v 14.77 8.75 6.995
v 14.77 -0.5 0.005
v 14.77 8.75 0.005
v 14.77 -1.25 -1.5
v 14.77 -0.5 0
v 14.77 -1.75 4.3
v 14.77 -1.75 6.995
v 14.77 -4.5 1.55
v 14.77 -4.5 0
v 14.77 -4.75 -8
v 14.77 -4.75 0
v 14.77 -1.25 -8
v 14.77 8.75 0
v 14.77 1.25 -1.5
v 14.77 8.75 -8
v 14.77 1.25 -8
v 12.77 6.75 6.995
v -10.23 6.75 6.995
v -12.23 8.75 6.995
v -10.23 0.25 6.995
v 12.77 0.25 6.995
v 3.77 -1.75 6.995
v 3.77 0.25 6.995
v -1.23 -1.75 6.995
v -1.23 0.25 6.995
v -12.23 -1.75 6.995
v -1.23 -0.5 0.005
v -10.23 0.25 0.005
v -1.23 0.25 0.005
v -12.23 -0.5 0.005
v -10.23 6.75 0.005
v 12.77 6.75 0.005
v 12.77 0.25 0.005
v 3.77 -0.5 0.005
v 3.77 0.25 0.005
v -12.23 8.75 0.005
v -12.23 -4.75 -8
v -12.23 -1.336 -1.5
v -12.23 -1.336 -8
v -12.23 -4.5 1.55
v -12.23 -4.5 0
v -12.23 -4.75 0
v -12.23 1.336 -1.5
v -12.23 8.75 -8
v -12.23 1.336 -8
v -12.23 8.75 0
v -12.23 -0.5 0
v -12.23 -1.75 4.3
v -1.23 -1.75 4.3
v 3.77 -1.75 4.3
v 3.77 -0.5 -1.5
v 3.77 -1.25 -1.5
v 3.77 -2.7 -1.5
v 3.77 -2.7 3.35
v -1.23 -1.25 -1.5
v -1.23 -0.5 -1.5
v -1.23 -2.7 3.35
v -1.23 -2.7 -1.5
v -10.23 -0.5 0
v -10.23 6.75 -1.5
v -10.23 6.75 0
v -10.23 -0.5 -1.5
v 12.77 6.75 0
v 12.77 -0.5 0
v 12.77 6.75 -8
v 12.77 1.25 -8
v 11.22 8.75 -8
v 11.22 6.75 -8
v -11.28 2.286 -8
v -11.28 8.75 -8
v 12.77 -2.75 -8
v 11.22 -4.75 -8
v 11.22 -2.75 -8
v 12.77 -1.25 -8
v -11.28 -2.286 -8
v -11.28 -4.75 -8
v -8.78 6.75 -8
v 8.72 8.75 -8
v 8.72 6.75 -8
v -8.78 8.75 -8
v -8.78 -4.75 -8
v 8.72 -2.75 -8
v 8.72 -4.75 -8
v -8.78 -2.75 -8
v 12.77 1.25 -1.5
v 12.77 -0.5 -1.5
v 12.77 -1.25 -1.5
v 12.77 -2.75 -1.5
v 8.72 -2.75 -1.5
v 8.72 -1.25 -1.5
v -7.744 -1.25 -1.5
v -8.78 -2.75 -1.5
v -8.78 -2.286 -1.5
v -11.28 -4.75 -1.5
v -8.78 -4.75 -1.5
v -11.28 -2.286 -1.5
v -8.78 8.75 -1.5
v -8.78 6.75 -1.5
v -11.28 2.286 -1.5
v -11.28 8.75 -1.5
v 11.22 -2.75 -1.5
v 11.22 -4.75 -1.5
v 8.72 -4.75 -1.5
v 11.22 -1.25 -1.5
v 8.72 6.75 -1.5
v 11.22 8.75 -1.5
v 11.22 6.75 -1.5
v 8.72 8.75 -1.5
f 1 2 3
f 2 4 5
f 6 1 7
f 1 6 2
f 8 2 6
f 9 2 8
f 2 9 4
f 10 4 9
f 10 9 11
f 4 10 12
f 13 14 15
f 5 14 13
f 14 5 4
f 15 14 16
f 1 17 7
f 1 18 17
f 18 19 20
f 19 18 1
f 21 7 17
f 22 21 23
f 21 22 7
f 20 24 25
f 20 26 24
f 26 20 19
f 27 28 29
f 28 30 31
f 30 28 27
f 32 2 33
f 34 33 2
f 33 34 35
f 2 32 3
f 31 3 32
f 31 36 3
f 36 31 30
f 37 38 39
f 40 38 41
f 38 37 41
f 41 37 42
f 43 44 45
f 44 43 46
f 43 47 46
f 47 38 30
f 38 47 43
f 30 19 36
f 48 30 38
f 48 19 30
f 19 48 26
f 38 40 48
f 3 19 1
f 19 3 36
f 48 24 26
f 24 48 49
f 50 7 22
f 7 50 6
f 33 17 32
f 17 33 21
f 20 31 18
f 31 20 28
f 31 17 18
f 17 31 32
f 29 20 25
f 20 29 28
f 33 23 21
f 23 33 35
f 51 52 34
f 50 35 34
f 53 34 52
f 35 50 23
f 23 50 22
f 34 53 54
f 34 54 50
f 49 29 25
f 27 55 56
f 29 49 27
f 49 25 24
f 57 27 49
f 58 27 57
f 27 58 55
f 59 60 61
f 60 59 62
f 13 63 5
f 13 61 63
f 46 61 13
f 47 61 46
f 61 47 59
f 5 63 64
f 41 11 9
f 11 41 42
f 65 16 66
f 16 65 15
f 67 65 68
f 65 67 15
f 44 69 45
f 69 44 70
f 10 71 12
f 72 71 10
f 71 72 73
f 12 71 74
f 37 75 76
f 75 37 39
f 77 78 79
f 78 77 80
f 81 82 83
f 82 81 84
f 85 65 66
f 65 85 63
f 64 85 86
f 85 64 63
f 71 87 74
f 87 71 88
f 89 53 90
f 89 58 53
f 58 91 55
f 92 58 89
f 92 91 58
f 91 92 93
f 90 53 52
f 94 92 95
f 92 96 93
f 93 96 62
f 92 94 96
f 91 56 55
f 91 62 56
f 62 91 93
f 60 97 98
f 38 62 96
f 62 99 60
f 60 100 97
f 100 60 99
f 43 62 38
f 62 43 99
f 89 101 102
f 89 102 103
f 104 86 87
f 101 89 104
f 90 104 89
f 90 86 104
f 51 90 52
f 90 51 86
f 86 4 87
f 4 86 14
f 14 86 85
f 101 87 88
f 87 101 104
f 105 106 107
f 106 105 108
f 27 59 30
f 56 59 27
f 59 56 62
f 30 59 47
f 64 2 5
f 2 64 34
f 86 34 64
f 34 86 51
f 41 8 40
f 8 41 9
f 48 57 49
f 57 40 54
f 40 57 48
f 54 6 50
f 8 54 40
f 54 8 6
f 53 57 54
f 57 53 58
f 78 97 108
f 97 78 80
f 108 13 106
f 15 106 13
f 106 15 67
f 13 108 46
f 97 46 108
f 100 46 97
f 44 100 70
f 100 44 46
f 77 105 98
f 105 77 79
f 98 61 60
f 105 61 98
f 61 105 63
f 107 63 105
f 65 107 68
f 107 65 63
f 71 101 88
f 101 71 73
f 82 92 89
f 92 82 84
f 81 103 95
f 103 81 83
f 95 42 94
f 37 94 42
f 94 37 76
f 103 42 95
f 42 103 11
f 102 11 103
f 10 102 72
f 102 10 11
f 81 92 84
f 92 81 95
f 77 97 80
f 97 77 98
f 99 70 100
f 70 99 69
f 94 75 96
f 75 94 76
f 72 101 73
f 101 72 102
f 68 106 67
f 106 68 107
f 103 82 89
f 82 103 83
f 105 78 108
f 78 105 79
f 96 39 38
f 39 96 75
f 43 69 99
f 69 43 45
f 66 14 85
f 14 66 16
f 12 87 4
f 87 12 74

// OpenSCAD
// file: connector14p.scad
include <center.scad>

module connector14p()
{
  dim_conn_base=[22.5,6,10.5];
  dim_conn_notch=[3.9,0.9,6.9];
  hole_depth=8;
  difference()
  {
    box(dim_conn_base);
    // pin holes
    translate([0,0,-dim_conn_base[2]/2])
    for(i=[-3,-2,-1,0,1,2,3])
     for(j=[-0.5,0.5])
       translate([i*2.54,j*2.54,0])
         box([0.5,0.5,2*hole_depth]);
    // flatcable opening
    translate([0,0,dim_conn_base[2]/2-3])
      box([14*1.27,20,1.27]);
  }
  // alignment notch
  translate([0,dim_conn_base[1]/2+dim_conn_notch[1]/2,-dim_conn_base[2]/2+dim_conn_notch[2]/2])
    box(dim_conn_notch);
  // cable holder
  translate([0,0,6.6])
  {
    translate([0,0,1.5])
      box([18,3,4]);
    // side blocks
    for(i=[-1,1])
      translate([i*10.25,0,0])
        box([2,6,4]);
  }
}
// file: sensor_adxl355.scad
module sensor_adxl355()
{
  sensor_pcb  = [20.4,20.4,1.6]; // xyz pcb size ADXL355
  pins_plastic = [15.2,2,5.3]; // plastic pins holder
  raster = 2.54; // standard raster, don't touch this
  pins_h = 1.6/2+2.7; // pins center height above pcb plane center
  pins_l = 8; // pins active length total
  pins_depth = 0; // pins depth inside of sensor (pins plastic bar front pos)
  pins_t = 0.5; // pin thickness of square side
  // PCB
  cube(sensor_pcb, center=true);
  // pins holder
  translate([0,-sensor_pcb[1]/2+pins_depth+pins_plastic[1]/2,pins_plastic[2]/2+sensor_pcb[2]/2])
    cube(pins_plastic, center=true);
  // pins array
  for(i = [-0.5,0.5])
    for(j = [-2.5,-1.5,-0.5, 0.5, 1.5, 2.5])
      translate([j*raster,-sensor_pcb[1]/2-pins_l/2+pins_depth,pins_h+i*raster])
        cube([pins_t,pins_l,pins_t],center=true);    
}
// file: center.scad
// helper include with default center=true

module box(dims, center=true) {
    cube(dims, center=center);
}

module rect(dims, center=true) {
    square(dims, center=center);
}

module disc(h, r, d, r1, r2, d1, d2, center=true) {
    cylinder(h=h, r=r, d=d, r1=r1, r2=r2, d1=d1, d2=d2, center=center);
}

module extrude(height, convexity, twist, scale, slices, center=true) {
    linear_extrude(height=height, convexity=convexity, twist=twist, scale=scale, slices=slices, center=center)
        children();
}

module surf(file, convexity, center=true) {
    surface(file=file, convexity=convexity, center=center);
}
// main file
include <center.scad>
include <sensor_adxl355.scad>
include <connector14p.scad>

// main outer dimensions
// clearance: 0.5: normal, 1.0: outside epoxy coating
clearance=1.0;
width=47.1-clearance;
height=55.0-clearance;
depth=40;
curvature_r=15;
thick=2; // wall thickness
over=3; // dihtung
diht_h=7; // dubinska veličima vijenca dihtunga
stop_over=thick;
stop_h=2*thick;

// PCB mount pads
mount_width=27; // hole center distance
mount_height=37; // hole center distance
mount_pad_h=4;
mount_pad_d=8;
mount_pad_hole=1.8;

// PCB mount rails
sensor_pcb  = [20.4,20.4,1.6]; // xyz pcb size ADXL355
sensor_rail_clr = [0.4,0,0.2];
sensor_rail_dim = [6,20]; // sensor rail d,h

// cover mount pads
cover_mtpad_width=width-(curvature_r+2*thick)/sqrt(2);
cover_mtpad_height=height-(curvature_r+2*thick)/sqrt(2);
cover_mtpad_h=12;
cover_mtpad_d=6;
cover_mtpad_hole=1.8;
cover_mtpad_hole_depth=5;
cover_hole=2.5;
cover_side_clearance=0.5; // from sides
cover_depth_clearance=0.4; // from top
cover_thick=4;

cable_width=12*1.27; // na poklopcu, širina kabla
cable_pass=9; // na poklopcu
cable_thick=1;

magnet_d=10;
magnet_d_clearance=0.5;
magnet_gore=2; // pomak od sredine prema gore

slider_y=8;
slider_z=4;
slider_depth=1.5; // how much deep under
slider_over=2; // enlarge slider's x-width
slider_cutover=1; // linear rail y-size for opening on top of slider

slider_clearance=0.6;

kajla_d1=slider_y*sqrt(2);
kajla_d2=kajla_d1+2;
kajla_h=slider_z+slider_depth;
kajla_hole=3.5; // 3.0 for 2.2 mm plastic screw, 3.5 for M3 screw

chep_d=12;
chep_screw_depth=chep_d-1;
chep_screw_hole=3.5; // 1.8 for 2.2mm plastic screw, 3.5 for M3 screw
chep_nut_d=5.65 * (2/sqrt(3)); // nut tight hex
chep_nut_depth=3.5; // total depth
chep_nut_ins_d=chep_nut_d+0.4; // enlarged insertion hex
chep_nut_ins_depth=1; // insertion depth
chep_nut_transition_depth=3; // easier 3D print, conical transition

module rounded_cube(v,r)
{
  minkowski()
  {
    h_minkowski=0.01;
    cube(v-[2*r,2*r,h_minkowski],center=true);
    cylinder(h=h_minkowski,r=r,$fn=90,center=true);
  };
}


// kutija sa zaobljenim kutevima
module kutija(strana=1,d=12)
{
      union()
      {
        if(1)
        difference()
        { // zaobljena kvadratična cijev
          union()
          {
            rounded_cube([width,height,depth],curvature_r);
            // the stopper not to enter too deep
            side=strana; // 1:left -1:right
            if(1)
            difference()
            {
              translate([side*(width/2-curvature_r),-height/2+curvature_r,depth/2-stop_h/2-0.001])
                cylinder(r2=curvature_r+over,r1=curvature_r,h=stop_h,center=true);
              // outer width cut
              if(1)
              translate([side*1.5*width,0,0])
                cube([2*width-0.001,2*height,2*depth],center=true);
            }
          }
          // izdubljena unutrašnjost
          rounded_cube([width-2*thick,height-2*thick,depth+0.01],curvature_r-thick);
          // cable, rez za izlaz kabla van
          translate([0,height/2-thick+thick/2-0.02,depth/2-thick/2])
            cube([cable_width,thick+0.2,thick+0.001],center=true);

        }
        // dno, stražnja strana
        if(1)
        translate([0,0,-depth/2-thick/2+0.01])
          rounded_cube([width+0*over,height+0*over,thick],curvature_r);
        // nogice za šarafe PCB-a
        if(0)
        for(i = [-1:2:1])
        for(j = [-1:2:1])
        translate([i*mount_width/2,j*mount_height/2,-depth/2-0.01])
          difference()
          {
            cylinder(d=mount_pad_d,h=mount_pad_h,center=false);
            cylinder(d=mount_pad_hole,h=mount_pad_h+0.01,center=false);
          }
        // PCB holder rails
        if(1)
        {
          //color([0.8,0.2,0.2]) // red
          for(i=[-1,1])
          translate([-i*(sensor_pcb[0]-sensor_rail_clr[0])/2,0,-depth/2+sensor_pcb[1]/2])
          {
            difference()
            {
              union()
              {
                cylinder(d=sensor_rail_dim[0],h=sensor_rail_dim[1],$fn=4,center=true);
                // up-down reinforcement
                cube([thick,height-thick,sensor_rail_dim[1]],center=true);
                // side reinforcement
                translate([-i*(width-thick-sensor_pcb[0])/4,0,0])
                cube([(width-thick-sensor_pcb[0])/2,thick,sensor_rail_dim[1]],center=true);
              }
              translate([i*(sensor_pcb[0]-sensor_rail_clr[0])/2,0,0])
                rotate([90,0,0])
                  cube(sensor_pcb+sensor_rail_clr, center=true);
            }
            //cube([thick,height,10],center=true);
          }
        }
        // vijenac za dihtung poklopca
        // problem fixme: incomplete manifold
        if(1)
        translate([0,0,depth/2-thick-diht_h/2])
          difference()
          {
            rounded_cube([width,height,diht_h],curvature_r);
            rounded_cube([width-4*over,height-4*over,diht_h+0.01],curvature_r-2*over);
            // screw holes
            for(i = [-1:2:1])
            for(j = [-1:2:1])
            {
              // screw hole (must be done again to the pads at the same position)
              translate([i*cover_mtpad_width/2,j*cover_mtpad_height/2,0])
                cylinder(d=cover_mtpad_hole,h=diht_h+0.02,center=true);
            }
            for(i = [-1:2:1])
            {
              // dihtung: print-friendly angular cuts
              translate([i*(width-thick-5*over)/2,0,-diht_h*0.5])
                rotate([0,45,0])
                  cube([3*over,cover_mtpad_height-cover_mtpad_d*0.3,3*over],center=true);
              translate([0,i*(height-thick-5*over)/2,-diht_h*0.5])
                rotate([45,0,0])
                  cube([cover_mtpad_width-cover_mtpad_d*0.3,3*over,3*over],center=true);

            }
          }
        // nogice za šarafe poklopca
        if(1)
        for(i = [-1:2:1])
        for(j = [-1:2:1])
        translate([i*cover_mtpad_width/2,j*cover_mtpad_height/2,depth/2-cover_mtpad_h-thick])
          difference()
          {
            // pad
            cylinder(d=cover_mtpad_d,h=cover_mtpad_h,center=false);
            // screw hole
            translate([0,0,cover_mtpad_h-cover_mtpad_hole_depth+0.01])
              cylinder(d=cover_mtpad_hole,h=cover_mtpad_hole_depth,center=false);
            // print friendly angular cut
            translate([-i*cover_mtpad_d*0.8,-j*cover_mtpad_d*0.8,0])
            rotate([0,0,i*j*45])
            rotate([0,1*45,0])
              cube([2*cover_mtpad_d,2*cover_mtpad_d,2*cover_mtpad_d],center=true);
          }
      }
}

module poklopac()
{
      // poklopac (samo dio za zaustavi prolaz)
      translate([0,0,depth/2-thick+cover_thick/2])
        difference()
        {
          // ploča poklopca
          union()
          {
            rounded_cube([width-2*thick-cover_side_clearance,height-2*thick-cover_side_clearance,cover_thick],curvature_r-thick-cover_side_clearance/2);
            // zub preko
            translate([0,0,cover_thick/2-(cover_thick-thick-cover_depth_clearance)/2])
              difference()
              {
                rounded_cube([width-cover_side_clearance,height-cover_side_clearance,cover_thick-thick-cover_depth_clearance],curvature_r-cover_side_clearance/2);
                // cable, rez za izlaz kabla van
                translate([0,height/2-thick+thick/2-0.1,0])
                  cube([cable_width,thick+0.2,thick+0.001],center=true);
              }
              // držač za skidanje s printera
              drzac_h=10;
              if(0)
              translate([0,-height/2+thick*2+over+drzac_h/2,-thick-drzac_h/2])
              difference()
              {
                cube([drzac_h*2,drzac_h,drzac_h],center=true);
                rotate([0,90,0])
                  cylinder(d=drzac_h/2,h=drzac_h*2+0.01,center=true);
              }
          }
          // rupe za šarafe
          for(i = [-1:2:1])
            for(j = [-1:2:1])
            {
              // screw hole (must be done again to the pads at the same position)
              translate([i*cover_mtpad_width/2,j*cover_mtpad_height/2,0])
                cylinder(d=cover_hole,h=cover_thick+0.01,$fn=10,center=true);
            }
          // cable, rez ispod poklopca
          translate([0,height/2-cable_pass/2,-cover_thick/2+cable_thick/2-0.01])
            cube([cable_width,cable_pass,cable_thick],center=true);
          // cable, rez za izlaz kabla van
          if(0)
          translate([0,-height/2+thick+cable_thick/2,0])
            cube([cable_width,cable_thick+0.01,thick+0.01],center=true);
        }
}

module magnet()
{
  if(0) // postavljen maget da se vidi kako stane
  translate([0,magnet_gore,depth/2+magnet_d/2+cover_thick-thick+thick*0])
    rotate([0,90,0])
      cylinder(d=10,h=width-clearance,center=true);
  translate([0,magnet_gore,depth/2+magnet_d/2+cover_thick-thick+thick/2])
  difference()
  {
    union()
    {
        // kocka koja sardrži magnet
        cube([width-clearance,magnet_d+2*thick+2*magnet_d_clearance,magnet_d+thick+magnet_d_clearance],center=true);
        // kocka za izvlačenje
        translate([0,-(magnet_d+2*thick+2*magnet_d_clearance)/2-magnet_d/2,0])
          cube([4*thick,magnet_d,magnet_d+thick+magnet_d_clearance],center=true);
        // podloga
        translate([0,-magnet_gore,-(magnet_d+thick+magnet_d_clearance)/2+thick/2])
          difference()
          {
            rounded_cube([width-cover_side_clearance,height-cover_side_clearance,thick],curvature_r-cover_side_clearance/2);
            // cable, rez za izlaz kabla van
            translate([0,height/2-thick+thick/2-0.1,0])
              cube([cable_width,thick+0.2,thick+0.001],center=true);
          }
    }
    // izrezana rupa za magnet
    translate([0,0,-thick/2])
    rotate([0,90,0])
      union()
      {
        // rupa za magnet
        cylinder(d=magnet_d+magnet_d_clearance,h=width-clearance+0.01,center=true);
        // print-friendly rez do kraja
        if(1)
        translate([(magnet_d+magnet_d_clearance)/2,0,0])
          cube([
          magnet_d+magnet_d_clearance,
          magnet_d+magnet_d_clearance,
          width-clearance+0.01,
          ],center=true);
      }
    // rupe za šarafe
          for(i = [-1:2:1])
            for(j = [-1:2:1])
            {
    // screw hole (must be done again to the pads at the same position)
              translate([i*cover_mtpad_width/2,j*cover_mtpad_height/2-magnet_gore,-(magnet_d+thick+magnet_d_clearance)/2+thick/2])
                cylinder(d=cover_hole,h=thick+0.01,$fn=10,center=true);
            }
            // rupa za izvlačenje
            translate([0,-(magnet_d+2*thick+2*magnet_d_clearance)/2-magnet_d/2,thick/2])
              rotate([0,90,0])
                    cylinder(d=6,h=4*thick+0.01,center=true);

  }
}

module slider_rod(add=0)
{
    
    cube([width+add+slider_over,slider_y+add,slider_z+add],center=true);
    
}

module kajla(add=0)
{
    intersection()
    {
      rotate([0,0,45])
          cylinder(d1=kajla_d1+add,d2=kajla_d2+add,h=kajla_h+add,$fn=4,center=true);
      // side intersect limits to redice y-size to that of the slider
      cube([width,slider_y+add,kajla_h+add],center=true);
    }
}

module chep(strana=1,kocka=0,kosina=1)
{
  d=chep_d;
  translate([0,0,depth/2+d/2+thick+clearance])
  difference()
  {
    union()
    {
      rounded_cube([width,height,d],curvature_r);
      // kocka za izvlačenje
      if(kocka>0.5)
      translate([0,-14,d])
        difference()
        {
          cube([1.5*d,d,d],center=true);
          rotate([0,90,0])
            cylinder(d=d/2,h=1.5*d+0.1,$fn=16,center=true);
        }
    }
    // cable, rez za izlaz kabla van
    translate([0,height/2-thick+thick/2-0.1,0])
      cube([cable_width,thick+0.2,d+0.001],center=true);
    // kosina za šaraf
    if(kosina>0.5)
    translate([-strana*cable_width/2,-(height/2+thick/4-0.1),0])
      rotate([-10,0,0])
        cube([cable_width,thick+0.2,2*d+0.001],center=true);
    // rebra za lakše skidanje
    nlines2=floor(width/thick/4);
    for(i=[-nlines2:nlines2])
      translate([i*thick*2,0,-d/2+cover_depth_clearance/2])
        cube([thick,height,cover_depth_clearance+0.01],center=true);
    // rupa za slider
    translate([0,0,d/2-slider_z/2-slider_depth])
      slider_rod(add=slider_clearance);
    kajla_add=slider_clearance;
    translate([0,0,d/2-kajla_h/2+0.001])
      kajla(add=slider_clearance);
    // rupa za šaraf slidera
    translate([0,0,d/2-chep_screw_depth/2])
      cylinder(d=chep_screw_hole,h=chep_screw_depth+0.01,$fn=16,center=true);
    // skinut gornji sloj iznad slidera
    // radi lakšeg printanja
    translate([0,0,slider_y/2+0.001])
      cube([width+0.01,slider_y-slider_cutover,slider_z],center=true);
    // duboki tijesni utor za maticu
    translate([0,0,-d/2+chep_nut_depth/2-0.001])
      cylinder(d=chep_nut_d,h=chep_nut_depth,$fn=6,center=true);
    // plitki labavi utor za maticu
    translate([0,0,-d/2+chep_nut_ins_depth/2-0.001])
      cylinder(d=chep_nut_ins_d,h=chep_nut_ins_depth,$fn=6,center=true);
    // konusni prijelaz za lakše printanje
    if(1)
    translate([0,0,-d/2+chep_nut_depth+chep_nut_transition_depth/2-0.001])
      cylinder(d1=chep_nut_d,d2=0,h=chep_nut_transition_depth+0.005,$fn=6,center=true);

  }
}

module slider()
{
    translate([0,0,depth/2+chep_d/2+thick+clearance+chep_d/2-slider_z/2-slider_depth])
    {
      difference()
      {
        union()
        {
          slider_rod(add=0);
          // notches for easier removal
          if(1)
          for(i=[-1:2:1])
          translate([i*(width/2-slider_y/2),0,slider_z/2+slider_z/8])
            cube([slider_y,slider_y/2,slider_z/4],$fn=16,center=true);
        }
        // cut space for kajla
        slider_kajla_clearance=slider_clearance;
        translate([0,0,-slider_z/2+kajla_h/2+slider_kajla_clearance/2-0.01])
        kajla(add=slider_kajla_clearance);
        // holes for easier removal
        if(0)
        for(i=[-1:2:1])
          translate([i*width/4,0,0])
            cylinder(d=3,h=slider_z,$fn=16,center=true);
      }
      // place kajla
      translate([0,0,-slider_z/2+kajla_h/2])
      difference()
      {
        kajla();
        // central screw hole
        cylinder(d=kajla_hole,h=kajla_h+0.01,$fn=16,center=true);
      }
  }
}


module kutijica(kutija=1, poklopac=1, magnet=0, slider=0, chep=1, strana=1)
{
  union()
  {
    // zaobljeni dio četvrtaste cijevi
    if(kutija > 0.5)
      kutija(strana);
    if(poklopac > 0.5)
      poklopac();
    if(magnet > 0.5)
      magnet();
    if(chep > 0.5)
      chep(strana=strana);
    if(slider > 0.5)
        slider();
  }
}

pos_connector = [1.27,3.5,8];
%translate(pos_connector)
  connector14p();

module connector_holder()
{
  dim_conn_inner = [23,6.5,7];
  dim_conn_outer = dim_conn_inner+[4,4,-0.01];
  translate(pos_connector)
  {
    difference()
    {
      box(dim_conn_outer);
      // inside cut
      box(dim_conn_inner);
      // notch cut
      translate([0,-dim_conn_inner[1]/2,1])
        box([5,4,10]);
    };
    // fitting for pcb holder rails
    fitting_depth=8;
    difference()
    {
        union()
        {
          // top
          translate([0,dim_conn_outer[1]/2-1,-3.5-fitting_depth/2])
            box([dim_conn_outer[0],2,fitting_depth]);
          // bottom
          translate([0,-dim_conn_outer[1]/2-2,-3.5-fitting_depth/2])
            box([dim_conn_outer[0],2,fitting_depth]);
          // left-right
          for(i=[-1,1])
            translate([i*12.5,-1.5,-3.5-fitting_depth/2])
              box([2,13,fitting_depth]);
          // under bottom
          translate([0,-6,-2])
          difference()
          {
            box([27,4,6]);
            // print friendly 45 deg cut
            translate([0,-2,5])
              rotate([45,0,0])
                box([27+0.01,7,7]);
            // notch cut (again)
            translate([0,1,0])
              box([5,2.4,6]);
          }
        }
        // cut for rails
        // vertical rails cut
        for(i=[-1,1])
        {
          translate([-1.3+i*10,0,-10])
            box([2.5,40,10]);
        }
        // cut to fit rail joint reinforement
        if(1)
          translate([-11.3,-3.5,-10])
            rotate([0,0,45])
              box([5,5,10]);
        // horizontal rail cut
        translate([0,-3.5,-10])
          box([40,2.5,10]);
      }
  }
}

// 14-pin connector holder
if(1)
translate([0,0,-4.5])
connector_holder();

// kutija 1:generirat 0:ne
// poklopac 1:generirat 0:ne
// strana: -1:lijeva 1:desna
// chep: 1:generiraj 0:ne
difference()
{
if(0)
kutijica(kutija=1,poklopac=1,magnet=0,chep=1,slider=1,strana=1);
translate([0,0,-depth/2+sensor_pcb[1]/2])
  rotate([-90,0,0])
    %sensor_adxl355();
if(0)
translate([50,0,0])
    cube([100,100,100],center=true);
}
